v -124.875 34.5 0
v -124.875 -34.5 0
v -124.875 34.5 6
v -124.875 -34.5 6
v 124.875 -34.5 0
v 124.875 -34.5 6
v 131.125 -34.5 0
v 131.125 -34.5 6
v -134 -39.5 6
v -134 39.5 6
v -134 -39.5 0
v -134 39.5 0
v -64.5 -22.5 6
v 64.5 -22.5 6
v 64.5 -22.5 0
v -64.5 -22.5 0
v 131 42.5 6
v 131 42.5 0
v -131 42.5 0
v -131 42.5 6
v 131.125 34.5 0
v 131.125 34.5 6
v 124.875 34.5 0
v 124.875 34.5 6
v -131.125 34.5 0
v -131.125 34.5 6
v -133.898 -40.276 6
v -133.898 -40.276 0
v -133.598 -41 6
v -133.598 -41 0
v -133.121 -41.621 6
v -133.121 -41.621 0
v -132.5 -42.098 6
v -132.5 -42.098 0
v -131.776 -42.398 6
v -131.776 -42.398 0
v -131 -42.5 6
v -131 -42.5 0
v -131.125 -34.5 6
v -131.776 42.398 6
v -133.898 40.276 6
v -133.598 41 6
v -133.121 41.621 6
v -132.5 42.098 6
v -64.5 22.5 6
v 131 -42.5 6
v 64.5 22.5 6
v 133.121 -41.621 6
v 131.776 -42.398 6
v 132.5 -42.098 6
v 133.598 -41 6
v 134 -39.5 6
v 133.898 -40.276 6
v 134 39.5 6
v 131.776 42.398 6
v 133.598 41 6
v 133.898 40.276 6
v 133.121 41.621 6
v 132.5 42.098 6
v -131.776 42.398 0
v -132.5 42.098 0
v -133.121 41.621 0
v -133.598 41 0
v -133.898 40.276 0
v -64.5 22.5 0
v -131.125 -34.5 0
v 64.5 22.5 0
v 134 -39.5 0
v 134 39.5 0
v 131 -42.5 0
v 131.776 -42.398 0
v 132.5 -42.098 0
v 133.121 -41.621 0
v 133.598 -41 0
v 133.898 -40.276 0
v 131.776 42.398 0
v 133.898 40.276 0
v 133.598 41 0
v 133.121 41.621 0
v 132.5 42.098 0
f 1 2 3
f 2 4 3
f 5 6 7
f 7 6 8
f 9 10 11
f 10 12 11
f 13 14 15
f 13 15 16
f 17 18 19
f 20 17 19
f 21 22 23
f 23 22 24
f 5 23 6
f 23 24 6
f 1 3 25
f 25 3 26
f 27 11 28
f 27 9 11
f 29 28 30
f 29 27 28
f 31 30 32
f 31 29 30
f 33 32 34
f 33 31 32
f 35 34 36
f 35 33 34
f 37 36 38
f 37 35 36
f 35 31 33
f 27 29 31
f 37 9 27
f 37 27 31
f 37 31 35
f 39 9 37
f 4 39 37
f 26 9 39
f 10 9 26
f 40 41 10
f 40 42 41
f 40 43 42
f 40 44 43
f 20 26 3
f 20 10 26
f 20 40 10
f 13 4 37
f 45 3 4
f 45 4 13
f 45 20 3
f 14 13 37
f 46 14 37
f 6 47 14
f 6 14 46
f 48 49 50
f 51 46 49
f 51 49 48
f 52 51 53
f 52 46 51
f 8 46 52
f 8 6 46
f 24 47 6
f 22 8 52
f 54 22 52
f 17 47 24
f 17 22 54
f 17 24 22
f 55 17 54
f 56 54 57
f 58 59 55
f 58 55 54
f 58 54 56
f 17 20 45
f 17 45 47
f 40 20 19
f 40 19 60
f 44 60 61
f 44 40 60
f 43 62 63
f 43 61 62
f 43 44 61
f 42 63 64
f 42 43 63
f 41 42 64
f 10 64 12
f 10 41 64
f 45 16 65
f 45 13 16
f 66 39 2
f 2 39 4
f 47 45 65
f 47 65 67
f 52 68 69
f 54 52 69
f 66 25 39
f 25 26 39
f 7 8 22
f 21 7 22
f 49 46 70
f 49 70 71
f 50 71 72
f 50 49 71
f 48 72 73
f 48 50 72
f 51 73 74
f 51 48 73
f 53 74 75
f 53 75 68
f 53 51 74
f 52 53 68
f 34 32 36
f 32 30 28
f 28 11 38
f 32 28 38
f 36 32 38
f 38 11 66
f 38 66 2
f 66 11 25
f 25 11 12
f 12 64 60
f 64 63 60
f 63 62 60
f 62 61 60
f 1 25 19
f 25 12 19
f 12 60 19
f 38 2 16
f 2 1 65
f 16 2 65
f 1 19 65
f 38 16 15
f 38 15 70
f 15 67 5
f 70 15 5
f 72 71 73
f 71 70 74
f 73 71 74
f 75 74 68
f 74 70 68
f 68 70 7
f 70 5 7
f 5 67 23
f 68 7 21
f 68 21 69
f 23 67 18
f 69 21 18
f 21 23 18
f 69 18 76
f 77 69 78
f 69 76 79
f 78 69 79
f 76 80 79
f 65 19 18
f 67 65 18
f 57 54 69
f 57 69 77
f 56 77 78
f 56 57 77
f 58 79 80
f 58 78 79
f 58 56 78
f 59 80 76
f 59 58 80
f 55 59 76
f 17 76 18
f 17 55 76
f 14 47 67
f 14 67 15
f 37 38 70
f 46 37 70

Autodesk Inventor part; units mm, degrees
ref_plane "YZ Plane" through (0, 0, 0) normal (1, 0, 0) x (0, 1, 0)
ref_plane "XZ Plane" through (0, 0, 0) normal (0, 1, 0) x (-1, 0, 0)
ref_plane "XY Plane" through (0, 0, 0) normal (0, 0, 1) x (1, 0, 0)
sketch "Sketch1" plane through (0, 0, 0) normal (0, 0, 1) x (1, 0, 0)
  line L0 (-134, -42.5) -> (134, -42.5)
  line L1 (134, -42.5) -> (134, 42.5)
  line L2 (134, 42.5) -> (-134, 42.5)
  line L3 (-134, 42.5) -> (-134, -42.5)
  line L4 (-134, -42.5) -> (134, 42.5) construction
  line L5 (134, -42.5) -> (-134, 42.5) construction
  point P0 (0, 0)
  dimension "d0" = 85
  dimension "d1" = 268
extrude "Extrusion1" add sketch "Sketch1" along normal blind 6
sketch "Sketch2" plane through (0, 0, 6) normal (0, 0, 1) x (1, 0, 0)
  line L0 (-134, -42.5) -> (134, -42.5) projected
  line L1 (134, -42.5) -> (134, 42.5) projected
  line L2 (-131.125, -34.5) -> (-124.875, -34.5)
  line L3 (-124.875, -34.5) -> (-124.875, 34.5)
  line L4 (-124.875, 34.5) -> (-131.125, 34.5)
  line L5 (-131.125, 34.5) -> (-131.125, -34.5)
  line L6 (-131.125, -34.5) -> (-124.875, 34.5) construction
  line L7 (-124.875, -34.5) -> (-131.125, 34.5) construction
  line L8 (124.875, -34.5) -> (131.125, -34.5)
  line L9 (131.125, -34.5) -> (131.125, 34.5)
  line L10 (131.125, 34.5) -> (124.875, 34.5)
  line L11 (124.875, 34.5) -> (124.875, -34.5)
  line L12 (124.875, -34.5) -> (131.125, 34.5) construction
  line L13 (131.125, -34.5) -> (124.875, 34.5) construction
  line L14 (134, 42.5) -> (-134, 42.5) projected
  line L15 (-134, 42.5) -> (-134, -42.5) projected
  point P0 (0, 0)
  point P1 (-128, 0)
  point P2 (128, 0)
  dimension "d5" = 2.875
  dimension "d6" = 6.25
  dimension "d8" = 8
  dimension "d34" = 2.875
  dimension "d35" = 8
extrude "Extrusion2" cut sketch "Sketch2" against normal through all contours L5 L4 L3 L2 | L11 L10 L9 L8
fillet "Fillet1" radius 3 4 edges at (134, -42.5, 3) (134, 42.5, 3) (-134, -42.5, 3) (-134, 42.5, 3)
sketch "Sketch4" plane through (0, 0, 6) normal (0, 0, 1) x (1, 0, 0)
  line L0 (64.5, -22.5) -> (-64.5, -22.5)
  line L1 (-64.5, -22.5) -> (-64.5, 22.5)
  line L2 (-64.5, 22.5) -> (64.5, 22.5)
  line L3 (64.5, 22.5) -> (64.5, -22.5)
  line L4 (64.5, -22.5) -> (-64.5, 22.5) construction
  line L5 (-64.5, -22.5) -> (64.5, 22.5) construction
  line L6 (131, 42.5) -> (-131, 42.5) projected
  line L7 (-131, -42.5) -> (131, -42.5) projected
  line L8 (0, -42.5) -> (0, 0) construction
  dimension "d2" = 6
  dimension "d33" = 20
  dimension "d36" = 129
  dimension "d37" = 20
extrude "Extrusion5" cut sketch "Sketch4" against normal blind 10
equation "\"d34\" = d5"
properties part number "TopFrontPanel"
